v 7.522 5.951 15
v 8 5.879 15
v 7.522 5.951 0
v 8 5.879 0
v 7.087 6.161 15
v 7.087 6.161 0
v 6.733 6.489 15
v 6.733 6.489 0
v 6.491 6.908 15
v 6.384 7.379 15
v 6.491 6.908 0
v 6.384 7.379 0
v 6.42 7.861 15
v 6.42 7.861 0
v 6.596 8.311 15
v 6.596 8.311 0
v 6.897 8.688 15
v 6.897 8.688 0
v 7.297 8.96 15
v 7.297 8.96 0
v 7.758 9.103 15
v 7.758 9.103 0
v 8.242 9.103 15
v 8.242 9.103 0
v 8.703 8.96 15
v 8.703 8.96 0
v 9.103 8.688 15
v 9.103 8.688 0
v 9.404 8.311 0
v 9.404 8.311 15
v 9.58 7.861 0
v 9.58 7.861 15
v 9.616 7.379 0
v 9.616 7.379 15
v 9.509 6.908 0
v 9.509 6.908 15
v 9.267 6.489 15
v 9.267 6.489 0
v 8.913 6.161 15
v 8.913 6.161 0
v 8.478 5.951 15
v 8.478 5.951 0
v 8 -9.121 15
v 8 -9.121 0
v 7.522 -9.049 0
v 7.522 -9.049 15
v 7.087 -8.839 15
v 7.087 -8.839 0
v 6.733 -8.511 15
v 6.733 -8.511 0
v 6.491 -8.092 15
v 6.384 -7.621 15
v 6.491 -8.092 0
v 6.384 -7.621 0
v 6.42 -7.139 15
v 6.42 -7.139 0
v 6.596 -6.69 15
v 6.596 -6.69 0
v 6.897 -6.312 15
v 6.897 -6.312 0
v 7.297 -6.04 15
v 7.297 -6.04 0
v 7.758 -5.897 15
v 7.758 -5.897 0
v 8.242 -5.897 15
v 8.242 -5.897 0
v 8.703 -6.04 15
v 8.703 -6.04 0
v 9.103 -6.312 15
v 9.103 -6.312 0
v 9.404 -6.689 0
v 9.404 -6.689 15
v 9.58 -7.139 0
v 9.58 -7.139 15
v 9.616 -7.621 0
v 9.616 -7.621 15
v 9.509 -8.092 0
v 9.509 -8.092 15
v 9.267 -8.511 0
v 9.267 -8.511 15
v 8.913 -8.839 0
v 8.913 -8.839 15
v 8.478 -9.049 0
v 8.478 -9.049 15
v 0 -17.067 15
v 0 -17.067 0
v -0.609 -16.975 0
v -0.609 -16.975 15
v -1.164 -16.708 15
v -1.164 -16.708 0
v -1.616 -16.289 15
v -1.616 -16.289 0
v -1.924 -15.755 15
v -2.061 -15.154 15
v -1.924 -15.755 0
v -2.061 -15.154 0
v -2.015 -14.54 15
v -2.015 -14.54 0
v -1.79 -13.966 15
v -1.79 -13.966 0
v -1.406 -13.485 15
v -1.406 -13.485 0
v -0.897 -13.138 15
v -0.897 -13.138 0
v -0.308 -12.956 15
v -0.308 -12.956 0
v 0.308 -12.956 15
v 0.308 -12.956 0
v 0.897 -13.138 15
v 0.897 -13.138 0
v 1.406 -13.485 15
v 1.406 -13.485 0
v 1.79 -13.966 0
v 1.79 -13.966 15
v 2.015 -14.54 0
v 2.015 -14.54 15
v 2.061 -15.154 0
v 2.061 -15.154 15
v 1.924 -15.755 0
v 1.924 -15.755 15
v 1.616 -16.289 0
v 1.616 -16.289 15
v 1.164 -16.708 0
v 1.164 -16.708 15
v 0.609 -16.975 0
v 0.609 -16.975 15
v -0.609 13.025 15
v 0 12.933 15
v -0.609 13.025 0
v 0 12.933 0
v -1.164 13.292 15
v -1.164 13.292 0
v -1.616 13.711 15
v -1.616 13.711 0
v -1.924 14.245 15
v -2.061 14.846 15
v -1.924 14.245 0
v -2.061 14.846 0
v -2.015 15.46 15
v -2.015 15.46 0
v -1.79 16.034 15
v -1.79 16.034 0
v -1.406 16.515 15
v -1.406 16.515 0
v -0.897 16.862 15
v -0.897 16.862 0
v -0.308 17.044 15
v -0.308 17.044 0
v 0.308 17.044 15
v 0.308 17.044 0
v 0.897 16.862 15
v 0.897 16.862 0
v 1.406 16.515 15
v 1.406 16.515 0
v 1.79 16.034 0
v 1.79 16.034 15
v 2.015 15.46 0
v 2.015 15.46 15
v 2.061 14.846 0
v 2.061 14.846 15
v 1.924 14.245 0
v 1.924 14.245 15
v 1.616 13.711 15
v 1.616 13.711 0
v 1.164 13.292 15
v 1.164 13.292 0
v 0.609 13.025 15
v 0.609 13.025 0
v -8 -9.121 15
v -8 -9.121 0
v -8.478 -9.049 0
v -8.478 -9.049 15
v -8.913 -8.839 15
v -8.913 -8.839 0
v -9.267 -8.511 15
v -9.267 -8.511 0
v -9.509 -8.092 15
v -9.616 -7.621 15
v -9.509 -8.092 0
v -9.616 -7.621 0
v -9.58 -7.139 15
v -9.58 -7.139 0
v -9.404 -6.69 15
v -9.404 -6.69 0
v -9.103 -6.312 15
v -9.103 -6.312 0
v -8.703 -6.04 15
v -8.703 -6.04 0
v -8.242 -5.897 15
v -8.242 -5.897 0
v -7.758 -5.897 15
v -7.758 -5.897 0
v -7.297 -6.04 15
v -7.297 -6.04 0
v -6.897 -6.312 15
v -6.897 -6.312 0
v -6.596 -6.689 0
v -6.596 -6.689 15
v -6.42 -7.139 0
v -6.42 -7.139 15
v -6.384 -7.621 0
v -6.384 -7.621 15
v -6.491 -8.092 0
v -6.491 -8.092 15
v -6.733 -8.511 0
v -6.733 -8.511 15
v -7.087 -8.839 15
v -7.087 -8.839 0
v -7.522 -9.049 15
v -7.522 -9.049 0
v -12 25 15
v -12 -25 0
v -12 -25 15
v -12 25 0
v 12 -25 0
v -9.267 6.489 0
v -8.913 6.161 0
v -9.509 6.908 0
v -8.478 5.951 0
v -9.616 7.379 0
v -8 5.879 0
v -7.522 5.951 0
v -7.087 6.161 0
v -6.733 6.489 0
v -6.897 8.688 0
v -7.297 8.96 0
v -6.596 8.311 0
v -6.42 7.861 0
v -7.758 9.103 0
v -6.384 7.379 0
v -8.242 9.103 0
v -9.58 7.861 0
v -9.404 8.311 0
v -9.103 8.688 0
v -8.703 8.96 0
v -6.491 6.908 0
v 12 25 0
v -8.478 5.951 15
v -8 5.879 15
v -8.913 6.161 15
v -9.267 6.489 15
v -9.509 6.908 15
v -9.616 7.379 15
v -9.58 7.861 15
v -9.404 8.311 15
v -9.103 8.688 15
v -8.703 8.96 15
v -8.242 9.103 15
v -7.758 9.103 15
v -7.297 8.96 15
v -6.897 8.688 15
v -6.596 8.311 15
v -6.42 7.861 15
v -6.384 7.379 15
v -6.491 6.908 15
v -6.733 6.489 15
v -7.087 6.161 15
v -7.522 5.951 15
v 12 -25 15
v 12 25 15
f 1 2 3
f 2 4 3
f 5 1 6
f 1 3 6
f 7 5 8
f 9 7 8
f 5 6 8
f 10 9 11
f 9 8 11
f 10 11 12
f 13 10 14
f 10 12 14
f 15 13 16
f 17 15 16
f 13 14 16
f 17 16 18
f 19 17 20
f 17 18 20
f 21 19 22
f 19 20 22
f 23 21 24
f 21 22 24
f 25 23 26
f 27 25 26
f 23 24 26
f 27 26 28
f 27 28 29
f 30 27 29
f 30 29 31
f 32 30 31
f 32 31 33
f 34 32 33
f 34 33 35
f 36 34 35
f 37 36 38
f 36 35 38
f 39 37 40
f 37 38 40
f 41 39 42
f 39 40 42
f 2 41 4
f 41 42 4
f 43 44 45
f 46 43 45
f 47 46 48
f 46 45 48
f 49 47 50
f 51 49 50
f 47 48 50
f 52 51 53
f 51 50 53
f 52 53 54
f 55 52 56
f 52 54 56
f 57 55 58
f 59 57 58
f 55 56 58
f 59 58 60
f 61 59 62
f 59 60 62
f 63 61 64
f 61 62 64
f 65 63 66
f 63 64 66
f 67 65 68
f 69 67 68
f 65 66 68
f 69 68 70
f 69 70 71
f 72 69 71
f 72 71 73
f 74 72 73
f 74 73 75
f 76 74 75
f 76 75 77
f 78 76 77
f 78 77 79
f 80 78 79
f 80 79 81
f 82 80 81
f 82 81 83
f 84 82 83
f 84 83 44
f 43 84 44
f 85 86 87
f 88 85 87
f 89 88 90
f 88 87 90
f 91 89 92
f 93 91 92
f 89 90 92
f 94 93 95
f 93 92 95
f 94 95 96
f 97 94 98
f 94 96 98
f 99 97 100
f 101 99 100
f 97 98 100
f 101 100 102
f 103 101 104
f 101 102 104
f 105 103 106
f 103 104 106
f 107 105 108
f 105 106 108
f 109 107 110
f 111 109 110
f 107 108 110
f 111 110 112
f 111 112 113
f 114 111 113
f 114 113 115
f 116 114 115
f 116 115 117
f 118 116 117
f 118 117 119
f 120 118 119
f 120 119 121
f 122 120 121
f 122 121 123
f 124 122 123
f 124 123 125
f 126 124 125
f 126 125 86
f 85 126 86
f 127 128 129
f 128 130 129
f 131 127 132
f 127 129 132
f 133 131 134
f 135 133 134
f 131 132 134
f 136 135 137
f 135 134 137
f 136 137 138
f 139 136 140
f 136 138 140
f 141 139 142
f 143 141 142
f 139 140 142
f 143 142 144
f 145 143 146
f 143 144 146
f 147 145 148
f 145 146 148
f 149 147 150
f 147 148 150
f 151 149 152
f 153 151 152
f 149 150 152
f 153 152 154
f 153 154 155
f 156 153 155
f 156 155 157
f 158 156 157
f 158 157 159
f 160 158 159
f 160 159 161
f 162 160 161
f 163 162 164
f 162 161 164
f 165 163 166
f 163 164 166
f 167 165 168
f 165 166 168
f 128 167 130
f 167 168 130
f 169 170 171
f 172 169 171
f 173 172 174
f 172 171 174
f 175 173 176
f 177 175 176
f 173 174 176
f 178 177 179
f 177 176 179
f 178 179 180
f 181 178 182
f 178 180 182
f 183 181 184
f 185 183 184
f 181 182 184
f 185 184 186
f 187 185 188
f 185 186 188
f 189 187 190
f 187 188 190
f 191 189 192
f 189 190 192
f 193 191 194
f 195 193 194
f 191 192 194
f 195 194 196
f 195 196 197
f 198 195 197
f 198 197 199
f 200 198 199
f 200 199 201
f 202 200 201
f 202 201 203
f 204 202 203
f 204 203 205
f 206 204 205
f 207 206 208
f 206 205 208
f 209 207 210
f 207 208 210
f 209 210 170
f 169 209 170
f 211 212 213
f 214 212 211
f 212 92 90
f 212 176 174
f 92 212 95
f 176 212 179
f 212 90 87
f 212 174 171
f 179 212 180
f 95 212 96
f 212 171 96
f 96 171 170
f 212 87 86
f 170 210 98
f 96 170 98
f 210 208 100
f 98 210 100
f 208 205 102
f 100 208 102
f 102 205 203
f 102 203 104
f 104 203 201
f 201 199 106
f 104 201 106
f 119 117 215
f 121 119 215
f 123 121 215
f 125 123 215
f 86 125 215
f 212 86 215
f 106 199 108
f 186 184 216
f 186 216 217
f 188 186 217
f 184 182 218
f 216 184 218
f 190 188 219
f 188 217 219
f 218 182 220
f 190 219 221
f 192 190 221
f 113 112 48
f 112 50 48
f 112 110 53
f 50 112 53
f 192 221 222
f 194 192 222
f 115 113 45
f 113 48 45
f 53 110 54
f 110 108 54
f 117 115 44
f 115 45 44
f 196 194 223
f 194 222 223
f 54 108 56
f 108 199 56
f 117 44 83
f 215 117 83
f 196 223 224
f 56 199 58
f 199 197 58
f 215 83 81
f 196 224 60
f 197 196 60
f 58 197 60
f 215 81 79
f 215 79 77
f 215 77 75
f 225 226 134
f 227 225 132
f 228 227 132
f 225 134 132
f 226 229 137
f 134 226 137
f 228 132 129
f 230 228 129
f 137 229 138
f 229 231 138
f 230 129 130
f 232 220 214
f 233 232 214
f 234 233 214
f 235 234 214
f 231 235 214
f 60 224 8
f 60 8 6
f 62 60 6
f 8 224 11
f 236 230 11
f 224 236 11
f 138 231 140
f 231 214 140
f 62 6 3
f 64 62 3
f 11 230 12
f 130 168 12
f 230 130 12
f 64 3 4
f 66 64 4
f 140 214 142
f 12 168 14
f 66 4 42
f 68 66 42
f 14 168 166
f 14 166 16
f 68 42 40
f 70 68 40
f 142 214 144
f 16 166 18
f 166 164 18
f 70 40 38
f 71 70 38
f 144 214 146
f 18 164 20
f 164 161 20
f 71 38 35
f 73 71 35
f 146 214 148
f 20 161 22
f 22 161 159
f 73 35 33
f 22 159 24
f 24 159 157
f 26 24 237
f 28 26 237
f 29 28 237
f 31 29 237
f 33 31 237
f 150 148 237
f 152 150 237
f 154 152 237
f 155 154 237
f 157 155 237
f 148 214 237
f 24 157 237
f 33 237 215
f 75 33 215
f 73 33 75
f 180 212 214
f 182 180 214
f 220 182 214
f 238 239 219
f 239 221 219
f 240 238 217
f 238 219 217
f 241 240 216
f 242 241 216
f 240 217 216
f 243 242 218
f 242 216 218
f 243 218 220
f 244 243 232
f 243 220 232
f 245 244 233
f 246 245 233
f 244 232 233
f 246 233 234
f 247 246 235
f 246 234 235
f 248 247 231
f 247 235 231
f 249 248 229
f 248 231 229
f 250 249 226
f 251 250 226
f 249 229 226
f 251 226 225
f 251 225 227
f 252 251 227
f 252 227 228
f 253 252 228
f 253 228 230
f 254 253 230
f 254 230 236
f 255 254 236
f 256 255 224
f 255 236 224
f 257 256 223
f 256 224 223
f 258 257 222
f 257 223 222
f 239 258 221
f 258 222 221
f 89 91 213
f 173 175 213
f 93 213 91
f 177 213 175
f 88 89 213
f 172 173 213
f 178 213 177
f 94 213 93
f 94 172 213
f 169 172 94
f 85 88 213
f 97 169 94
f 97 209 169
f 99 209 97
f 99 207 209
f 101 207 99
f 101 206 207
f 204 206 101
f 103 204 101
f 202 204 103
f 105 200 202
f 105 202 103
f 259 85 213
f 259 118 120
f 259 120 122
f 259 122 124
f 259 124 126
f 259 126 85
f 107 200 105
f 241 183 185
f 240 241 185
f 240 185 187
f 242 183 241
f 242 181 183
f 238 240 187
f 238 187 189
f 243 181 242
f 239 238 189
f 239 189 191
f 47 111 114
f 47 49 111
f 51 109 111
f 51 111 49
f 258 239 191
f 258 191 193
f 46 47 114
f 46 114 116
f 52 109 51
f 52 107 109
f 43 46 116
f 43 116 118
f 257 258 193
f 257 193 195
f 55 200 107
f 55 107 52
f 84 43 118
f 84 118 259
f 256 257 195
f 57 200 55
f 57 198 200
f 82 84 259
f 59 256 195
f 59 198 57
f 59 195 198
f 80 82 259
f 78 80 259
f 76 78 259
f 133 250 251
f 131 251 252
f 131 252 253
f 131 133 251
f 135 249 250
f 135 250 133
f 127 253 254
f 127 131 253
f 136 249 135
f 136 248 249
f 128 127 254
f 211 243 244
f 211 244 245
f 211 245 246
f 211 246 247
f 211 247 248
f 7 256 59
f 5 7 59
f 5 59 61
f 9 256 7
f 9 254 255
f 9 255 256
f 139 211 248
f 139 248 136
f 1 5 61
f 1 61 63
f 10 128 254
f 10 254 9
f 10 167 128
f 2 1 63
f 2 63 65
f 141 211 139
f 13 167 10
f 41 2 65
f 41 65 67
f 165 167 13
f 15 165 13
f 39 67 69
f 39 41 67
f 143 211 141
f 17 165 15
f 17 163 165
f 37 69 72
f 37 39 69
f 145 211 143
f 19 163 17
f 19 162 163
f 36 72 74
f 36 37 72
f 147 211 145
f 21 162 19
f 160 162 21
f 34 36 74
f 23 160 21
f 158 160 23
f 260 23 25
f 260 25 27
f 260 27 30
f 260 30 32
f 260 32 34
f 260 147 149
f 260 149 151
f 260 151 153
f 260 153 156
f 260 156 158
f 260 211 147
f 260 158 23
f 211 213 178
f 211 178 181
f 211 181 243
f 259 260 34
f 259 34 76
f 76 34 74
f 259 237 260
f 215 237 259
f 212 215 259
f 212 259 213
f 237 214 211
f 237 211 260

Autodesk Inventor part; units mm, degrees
ref_plane "YZ Plane" through (0, 0, 0) normal (1, 0, 0) x (0, 1, 0)
ref_plane "XZ Plane" through (0, 0, 0) normal (0, 1, 0) x (-1, 0, 0)
ref_plane "XY Plane" through (0, 0, 0) normal (0, 0, 1) x (1, 0, 0)
sketch "Skizze1" plane through (0, 0, 0) normal (0, 0, 1) x (1, 0, 0)
  line L0 (-12, 25) -> (12, 25)
  line L1 (12, 25) -> (12, -25)
  line L2 (12, -25) -> (-12, -25)
  line L3 (-12, -25) -> (-12, 25)
  line L4 (-16.8, 0) -> (16.8, 0) projected
  line L5 (0, -35) -> (0, 35) projected
  point P0 (0, 0)
  dimension "d0" = 24
  dimension "d1" = 50
extrude "Extrusion1" add sketch "Skizze1" along normal blind 15
sketch "Skizze2" plane through (0, 0, 15) normal (0, 0, 1) x (1, 0, 0)
  line L0 (-16.8, 0) -> (16.8, 0) projected
  line L1 (0, -35) -> (0, 35) projected
  line L2 (-8, 7.5) -> (8, 7.5)
  line L3 (8, 7.5) -> (8, -7.5)
  line L4 (8, -7.5) -> (-8, -7.5)
  line L5 (-8, -7.5) -> (-8, 7.5)
  point P0 (0, 0)
  dimension "d4" = 16
  dimension "d5" = 15
hole "Bohrung1" at (-8, 7.5, 15) at (8, 7.5, 15) at (8, -7.5, 15) at (-8, -7.5, 15) direction (0, 0, -1) diameter 3.242 end through all thread size "M4x0.7" class "6H" standard "ISO Metric profile"
sketch "Skizze3" plane through (0, 0, 15) normal (0, 0, 1) x (1, 0, 0)
  circle A0 centre (0, 15) radius 2.75 projected
  circle A1 centre (0, -15) radius 2.75 projected
  point P0 (0, 0)
hole "Bohrung2" at (0, 15, 15) at (0, -15, 15) direction (0, 0, -1) diameter 4.134 end through all thread size "M5x0.8" class "6H" standard "ISO Metric profile"
properties part number "13_0204_029"
